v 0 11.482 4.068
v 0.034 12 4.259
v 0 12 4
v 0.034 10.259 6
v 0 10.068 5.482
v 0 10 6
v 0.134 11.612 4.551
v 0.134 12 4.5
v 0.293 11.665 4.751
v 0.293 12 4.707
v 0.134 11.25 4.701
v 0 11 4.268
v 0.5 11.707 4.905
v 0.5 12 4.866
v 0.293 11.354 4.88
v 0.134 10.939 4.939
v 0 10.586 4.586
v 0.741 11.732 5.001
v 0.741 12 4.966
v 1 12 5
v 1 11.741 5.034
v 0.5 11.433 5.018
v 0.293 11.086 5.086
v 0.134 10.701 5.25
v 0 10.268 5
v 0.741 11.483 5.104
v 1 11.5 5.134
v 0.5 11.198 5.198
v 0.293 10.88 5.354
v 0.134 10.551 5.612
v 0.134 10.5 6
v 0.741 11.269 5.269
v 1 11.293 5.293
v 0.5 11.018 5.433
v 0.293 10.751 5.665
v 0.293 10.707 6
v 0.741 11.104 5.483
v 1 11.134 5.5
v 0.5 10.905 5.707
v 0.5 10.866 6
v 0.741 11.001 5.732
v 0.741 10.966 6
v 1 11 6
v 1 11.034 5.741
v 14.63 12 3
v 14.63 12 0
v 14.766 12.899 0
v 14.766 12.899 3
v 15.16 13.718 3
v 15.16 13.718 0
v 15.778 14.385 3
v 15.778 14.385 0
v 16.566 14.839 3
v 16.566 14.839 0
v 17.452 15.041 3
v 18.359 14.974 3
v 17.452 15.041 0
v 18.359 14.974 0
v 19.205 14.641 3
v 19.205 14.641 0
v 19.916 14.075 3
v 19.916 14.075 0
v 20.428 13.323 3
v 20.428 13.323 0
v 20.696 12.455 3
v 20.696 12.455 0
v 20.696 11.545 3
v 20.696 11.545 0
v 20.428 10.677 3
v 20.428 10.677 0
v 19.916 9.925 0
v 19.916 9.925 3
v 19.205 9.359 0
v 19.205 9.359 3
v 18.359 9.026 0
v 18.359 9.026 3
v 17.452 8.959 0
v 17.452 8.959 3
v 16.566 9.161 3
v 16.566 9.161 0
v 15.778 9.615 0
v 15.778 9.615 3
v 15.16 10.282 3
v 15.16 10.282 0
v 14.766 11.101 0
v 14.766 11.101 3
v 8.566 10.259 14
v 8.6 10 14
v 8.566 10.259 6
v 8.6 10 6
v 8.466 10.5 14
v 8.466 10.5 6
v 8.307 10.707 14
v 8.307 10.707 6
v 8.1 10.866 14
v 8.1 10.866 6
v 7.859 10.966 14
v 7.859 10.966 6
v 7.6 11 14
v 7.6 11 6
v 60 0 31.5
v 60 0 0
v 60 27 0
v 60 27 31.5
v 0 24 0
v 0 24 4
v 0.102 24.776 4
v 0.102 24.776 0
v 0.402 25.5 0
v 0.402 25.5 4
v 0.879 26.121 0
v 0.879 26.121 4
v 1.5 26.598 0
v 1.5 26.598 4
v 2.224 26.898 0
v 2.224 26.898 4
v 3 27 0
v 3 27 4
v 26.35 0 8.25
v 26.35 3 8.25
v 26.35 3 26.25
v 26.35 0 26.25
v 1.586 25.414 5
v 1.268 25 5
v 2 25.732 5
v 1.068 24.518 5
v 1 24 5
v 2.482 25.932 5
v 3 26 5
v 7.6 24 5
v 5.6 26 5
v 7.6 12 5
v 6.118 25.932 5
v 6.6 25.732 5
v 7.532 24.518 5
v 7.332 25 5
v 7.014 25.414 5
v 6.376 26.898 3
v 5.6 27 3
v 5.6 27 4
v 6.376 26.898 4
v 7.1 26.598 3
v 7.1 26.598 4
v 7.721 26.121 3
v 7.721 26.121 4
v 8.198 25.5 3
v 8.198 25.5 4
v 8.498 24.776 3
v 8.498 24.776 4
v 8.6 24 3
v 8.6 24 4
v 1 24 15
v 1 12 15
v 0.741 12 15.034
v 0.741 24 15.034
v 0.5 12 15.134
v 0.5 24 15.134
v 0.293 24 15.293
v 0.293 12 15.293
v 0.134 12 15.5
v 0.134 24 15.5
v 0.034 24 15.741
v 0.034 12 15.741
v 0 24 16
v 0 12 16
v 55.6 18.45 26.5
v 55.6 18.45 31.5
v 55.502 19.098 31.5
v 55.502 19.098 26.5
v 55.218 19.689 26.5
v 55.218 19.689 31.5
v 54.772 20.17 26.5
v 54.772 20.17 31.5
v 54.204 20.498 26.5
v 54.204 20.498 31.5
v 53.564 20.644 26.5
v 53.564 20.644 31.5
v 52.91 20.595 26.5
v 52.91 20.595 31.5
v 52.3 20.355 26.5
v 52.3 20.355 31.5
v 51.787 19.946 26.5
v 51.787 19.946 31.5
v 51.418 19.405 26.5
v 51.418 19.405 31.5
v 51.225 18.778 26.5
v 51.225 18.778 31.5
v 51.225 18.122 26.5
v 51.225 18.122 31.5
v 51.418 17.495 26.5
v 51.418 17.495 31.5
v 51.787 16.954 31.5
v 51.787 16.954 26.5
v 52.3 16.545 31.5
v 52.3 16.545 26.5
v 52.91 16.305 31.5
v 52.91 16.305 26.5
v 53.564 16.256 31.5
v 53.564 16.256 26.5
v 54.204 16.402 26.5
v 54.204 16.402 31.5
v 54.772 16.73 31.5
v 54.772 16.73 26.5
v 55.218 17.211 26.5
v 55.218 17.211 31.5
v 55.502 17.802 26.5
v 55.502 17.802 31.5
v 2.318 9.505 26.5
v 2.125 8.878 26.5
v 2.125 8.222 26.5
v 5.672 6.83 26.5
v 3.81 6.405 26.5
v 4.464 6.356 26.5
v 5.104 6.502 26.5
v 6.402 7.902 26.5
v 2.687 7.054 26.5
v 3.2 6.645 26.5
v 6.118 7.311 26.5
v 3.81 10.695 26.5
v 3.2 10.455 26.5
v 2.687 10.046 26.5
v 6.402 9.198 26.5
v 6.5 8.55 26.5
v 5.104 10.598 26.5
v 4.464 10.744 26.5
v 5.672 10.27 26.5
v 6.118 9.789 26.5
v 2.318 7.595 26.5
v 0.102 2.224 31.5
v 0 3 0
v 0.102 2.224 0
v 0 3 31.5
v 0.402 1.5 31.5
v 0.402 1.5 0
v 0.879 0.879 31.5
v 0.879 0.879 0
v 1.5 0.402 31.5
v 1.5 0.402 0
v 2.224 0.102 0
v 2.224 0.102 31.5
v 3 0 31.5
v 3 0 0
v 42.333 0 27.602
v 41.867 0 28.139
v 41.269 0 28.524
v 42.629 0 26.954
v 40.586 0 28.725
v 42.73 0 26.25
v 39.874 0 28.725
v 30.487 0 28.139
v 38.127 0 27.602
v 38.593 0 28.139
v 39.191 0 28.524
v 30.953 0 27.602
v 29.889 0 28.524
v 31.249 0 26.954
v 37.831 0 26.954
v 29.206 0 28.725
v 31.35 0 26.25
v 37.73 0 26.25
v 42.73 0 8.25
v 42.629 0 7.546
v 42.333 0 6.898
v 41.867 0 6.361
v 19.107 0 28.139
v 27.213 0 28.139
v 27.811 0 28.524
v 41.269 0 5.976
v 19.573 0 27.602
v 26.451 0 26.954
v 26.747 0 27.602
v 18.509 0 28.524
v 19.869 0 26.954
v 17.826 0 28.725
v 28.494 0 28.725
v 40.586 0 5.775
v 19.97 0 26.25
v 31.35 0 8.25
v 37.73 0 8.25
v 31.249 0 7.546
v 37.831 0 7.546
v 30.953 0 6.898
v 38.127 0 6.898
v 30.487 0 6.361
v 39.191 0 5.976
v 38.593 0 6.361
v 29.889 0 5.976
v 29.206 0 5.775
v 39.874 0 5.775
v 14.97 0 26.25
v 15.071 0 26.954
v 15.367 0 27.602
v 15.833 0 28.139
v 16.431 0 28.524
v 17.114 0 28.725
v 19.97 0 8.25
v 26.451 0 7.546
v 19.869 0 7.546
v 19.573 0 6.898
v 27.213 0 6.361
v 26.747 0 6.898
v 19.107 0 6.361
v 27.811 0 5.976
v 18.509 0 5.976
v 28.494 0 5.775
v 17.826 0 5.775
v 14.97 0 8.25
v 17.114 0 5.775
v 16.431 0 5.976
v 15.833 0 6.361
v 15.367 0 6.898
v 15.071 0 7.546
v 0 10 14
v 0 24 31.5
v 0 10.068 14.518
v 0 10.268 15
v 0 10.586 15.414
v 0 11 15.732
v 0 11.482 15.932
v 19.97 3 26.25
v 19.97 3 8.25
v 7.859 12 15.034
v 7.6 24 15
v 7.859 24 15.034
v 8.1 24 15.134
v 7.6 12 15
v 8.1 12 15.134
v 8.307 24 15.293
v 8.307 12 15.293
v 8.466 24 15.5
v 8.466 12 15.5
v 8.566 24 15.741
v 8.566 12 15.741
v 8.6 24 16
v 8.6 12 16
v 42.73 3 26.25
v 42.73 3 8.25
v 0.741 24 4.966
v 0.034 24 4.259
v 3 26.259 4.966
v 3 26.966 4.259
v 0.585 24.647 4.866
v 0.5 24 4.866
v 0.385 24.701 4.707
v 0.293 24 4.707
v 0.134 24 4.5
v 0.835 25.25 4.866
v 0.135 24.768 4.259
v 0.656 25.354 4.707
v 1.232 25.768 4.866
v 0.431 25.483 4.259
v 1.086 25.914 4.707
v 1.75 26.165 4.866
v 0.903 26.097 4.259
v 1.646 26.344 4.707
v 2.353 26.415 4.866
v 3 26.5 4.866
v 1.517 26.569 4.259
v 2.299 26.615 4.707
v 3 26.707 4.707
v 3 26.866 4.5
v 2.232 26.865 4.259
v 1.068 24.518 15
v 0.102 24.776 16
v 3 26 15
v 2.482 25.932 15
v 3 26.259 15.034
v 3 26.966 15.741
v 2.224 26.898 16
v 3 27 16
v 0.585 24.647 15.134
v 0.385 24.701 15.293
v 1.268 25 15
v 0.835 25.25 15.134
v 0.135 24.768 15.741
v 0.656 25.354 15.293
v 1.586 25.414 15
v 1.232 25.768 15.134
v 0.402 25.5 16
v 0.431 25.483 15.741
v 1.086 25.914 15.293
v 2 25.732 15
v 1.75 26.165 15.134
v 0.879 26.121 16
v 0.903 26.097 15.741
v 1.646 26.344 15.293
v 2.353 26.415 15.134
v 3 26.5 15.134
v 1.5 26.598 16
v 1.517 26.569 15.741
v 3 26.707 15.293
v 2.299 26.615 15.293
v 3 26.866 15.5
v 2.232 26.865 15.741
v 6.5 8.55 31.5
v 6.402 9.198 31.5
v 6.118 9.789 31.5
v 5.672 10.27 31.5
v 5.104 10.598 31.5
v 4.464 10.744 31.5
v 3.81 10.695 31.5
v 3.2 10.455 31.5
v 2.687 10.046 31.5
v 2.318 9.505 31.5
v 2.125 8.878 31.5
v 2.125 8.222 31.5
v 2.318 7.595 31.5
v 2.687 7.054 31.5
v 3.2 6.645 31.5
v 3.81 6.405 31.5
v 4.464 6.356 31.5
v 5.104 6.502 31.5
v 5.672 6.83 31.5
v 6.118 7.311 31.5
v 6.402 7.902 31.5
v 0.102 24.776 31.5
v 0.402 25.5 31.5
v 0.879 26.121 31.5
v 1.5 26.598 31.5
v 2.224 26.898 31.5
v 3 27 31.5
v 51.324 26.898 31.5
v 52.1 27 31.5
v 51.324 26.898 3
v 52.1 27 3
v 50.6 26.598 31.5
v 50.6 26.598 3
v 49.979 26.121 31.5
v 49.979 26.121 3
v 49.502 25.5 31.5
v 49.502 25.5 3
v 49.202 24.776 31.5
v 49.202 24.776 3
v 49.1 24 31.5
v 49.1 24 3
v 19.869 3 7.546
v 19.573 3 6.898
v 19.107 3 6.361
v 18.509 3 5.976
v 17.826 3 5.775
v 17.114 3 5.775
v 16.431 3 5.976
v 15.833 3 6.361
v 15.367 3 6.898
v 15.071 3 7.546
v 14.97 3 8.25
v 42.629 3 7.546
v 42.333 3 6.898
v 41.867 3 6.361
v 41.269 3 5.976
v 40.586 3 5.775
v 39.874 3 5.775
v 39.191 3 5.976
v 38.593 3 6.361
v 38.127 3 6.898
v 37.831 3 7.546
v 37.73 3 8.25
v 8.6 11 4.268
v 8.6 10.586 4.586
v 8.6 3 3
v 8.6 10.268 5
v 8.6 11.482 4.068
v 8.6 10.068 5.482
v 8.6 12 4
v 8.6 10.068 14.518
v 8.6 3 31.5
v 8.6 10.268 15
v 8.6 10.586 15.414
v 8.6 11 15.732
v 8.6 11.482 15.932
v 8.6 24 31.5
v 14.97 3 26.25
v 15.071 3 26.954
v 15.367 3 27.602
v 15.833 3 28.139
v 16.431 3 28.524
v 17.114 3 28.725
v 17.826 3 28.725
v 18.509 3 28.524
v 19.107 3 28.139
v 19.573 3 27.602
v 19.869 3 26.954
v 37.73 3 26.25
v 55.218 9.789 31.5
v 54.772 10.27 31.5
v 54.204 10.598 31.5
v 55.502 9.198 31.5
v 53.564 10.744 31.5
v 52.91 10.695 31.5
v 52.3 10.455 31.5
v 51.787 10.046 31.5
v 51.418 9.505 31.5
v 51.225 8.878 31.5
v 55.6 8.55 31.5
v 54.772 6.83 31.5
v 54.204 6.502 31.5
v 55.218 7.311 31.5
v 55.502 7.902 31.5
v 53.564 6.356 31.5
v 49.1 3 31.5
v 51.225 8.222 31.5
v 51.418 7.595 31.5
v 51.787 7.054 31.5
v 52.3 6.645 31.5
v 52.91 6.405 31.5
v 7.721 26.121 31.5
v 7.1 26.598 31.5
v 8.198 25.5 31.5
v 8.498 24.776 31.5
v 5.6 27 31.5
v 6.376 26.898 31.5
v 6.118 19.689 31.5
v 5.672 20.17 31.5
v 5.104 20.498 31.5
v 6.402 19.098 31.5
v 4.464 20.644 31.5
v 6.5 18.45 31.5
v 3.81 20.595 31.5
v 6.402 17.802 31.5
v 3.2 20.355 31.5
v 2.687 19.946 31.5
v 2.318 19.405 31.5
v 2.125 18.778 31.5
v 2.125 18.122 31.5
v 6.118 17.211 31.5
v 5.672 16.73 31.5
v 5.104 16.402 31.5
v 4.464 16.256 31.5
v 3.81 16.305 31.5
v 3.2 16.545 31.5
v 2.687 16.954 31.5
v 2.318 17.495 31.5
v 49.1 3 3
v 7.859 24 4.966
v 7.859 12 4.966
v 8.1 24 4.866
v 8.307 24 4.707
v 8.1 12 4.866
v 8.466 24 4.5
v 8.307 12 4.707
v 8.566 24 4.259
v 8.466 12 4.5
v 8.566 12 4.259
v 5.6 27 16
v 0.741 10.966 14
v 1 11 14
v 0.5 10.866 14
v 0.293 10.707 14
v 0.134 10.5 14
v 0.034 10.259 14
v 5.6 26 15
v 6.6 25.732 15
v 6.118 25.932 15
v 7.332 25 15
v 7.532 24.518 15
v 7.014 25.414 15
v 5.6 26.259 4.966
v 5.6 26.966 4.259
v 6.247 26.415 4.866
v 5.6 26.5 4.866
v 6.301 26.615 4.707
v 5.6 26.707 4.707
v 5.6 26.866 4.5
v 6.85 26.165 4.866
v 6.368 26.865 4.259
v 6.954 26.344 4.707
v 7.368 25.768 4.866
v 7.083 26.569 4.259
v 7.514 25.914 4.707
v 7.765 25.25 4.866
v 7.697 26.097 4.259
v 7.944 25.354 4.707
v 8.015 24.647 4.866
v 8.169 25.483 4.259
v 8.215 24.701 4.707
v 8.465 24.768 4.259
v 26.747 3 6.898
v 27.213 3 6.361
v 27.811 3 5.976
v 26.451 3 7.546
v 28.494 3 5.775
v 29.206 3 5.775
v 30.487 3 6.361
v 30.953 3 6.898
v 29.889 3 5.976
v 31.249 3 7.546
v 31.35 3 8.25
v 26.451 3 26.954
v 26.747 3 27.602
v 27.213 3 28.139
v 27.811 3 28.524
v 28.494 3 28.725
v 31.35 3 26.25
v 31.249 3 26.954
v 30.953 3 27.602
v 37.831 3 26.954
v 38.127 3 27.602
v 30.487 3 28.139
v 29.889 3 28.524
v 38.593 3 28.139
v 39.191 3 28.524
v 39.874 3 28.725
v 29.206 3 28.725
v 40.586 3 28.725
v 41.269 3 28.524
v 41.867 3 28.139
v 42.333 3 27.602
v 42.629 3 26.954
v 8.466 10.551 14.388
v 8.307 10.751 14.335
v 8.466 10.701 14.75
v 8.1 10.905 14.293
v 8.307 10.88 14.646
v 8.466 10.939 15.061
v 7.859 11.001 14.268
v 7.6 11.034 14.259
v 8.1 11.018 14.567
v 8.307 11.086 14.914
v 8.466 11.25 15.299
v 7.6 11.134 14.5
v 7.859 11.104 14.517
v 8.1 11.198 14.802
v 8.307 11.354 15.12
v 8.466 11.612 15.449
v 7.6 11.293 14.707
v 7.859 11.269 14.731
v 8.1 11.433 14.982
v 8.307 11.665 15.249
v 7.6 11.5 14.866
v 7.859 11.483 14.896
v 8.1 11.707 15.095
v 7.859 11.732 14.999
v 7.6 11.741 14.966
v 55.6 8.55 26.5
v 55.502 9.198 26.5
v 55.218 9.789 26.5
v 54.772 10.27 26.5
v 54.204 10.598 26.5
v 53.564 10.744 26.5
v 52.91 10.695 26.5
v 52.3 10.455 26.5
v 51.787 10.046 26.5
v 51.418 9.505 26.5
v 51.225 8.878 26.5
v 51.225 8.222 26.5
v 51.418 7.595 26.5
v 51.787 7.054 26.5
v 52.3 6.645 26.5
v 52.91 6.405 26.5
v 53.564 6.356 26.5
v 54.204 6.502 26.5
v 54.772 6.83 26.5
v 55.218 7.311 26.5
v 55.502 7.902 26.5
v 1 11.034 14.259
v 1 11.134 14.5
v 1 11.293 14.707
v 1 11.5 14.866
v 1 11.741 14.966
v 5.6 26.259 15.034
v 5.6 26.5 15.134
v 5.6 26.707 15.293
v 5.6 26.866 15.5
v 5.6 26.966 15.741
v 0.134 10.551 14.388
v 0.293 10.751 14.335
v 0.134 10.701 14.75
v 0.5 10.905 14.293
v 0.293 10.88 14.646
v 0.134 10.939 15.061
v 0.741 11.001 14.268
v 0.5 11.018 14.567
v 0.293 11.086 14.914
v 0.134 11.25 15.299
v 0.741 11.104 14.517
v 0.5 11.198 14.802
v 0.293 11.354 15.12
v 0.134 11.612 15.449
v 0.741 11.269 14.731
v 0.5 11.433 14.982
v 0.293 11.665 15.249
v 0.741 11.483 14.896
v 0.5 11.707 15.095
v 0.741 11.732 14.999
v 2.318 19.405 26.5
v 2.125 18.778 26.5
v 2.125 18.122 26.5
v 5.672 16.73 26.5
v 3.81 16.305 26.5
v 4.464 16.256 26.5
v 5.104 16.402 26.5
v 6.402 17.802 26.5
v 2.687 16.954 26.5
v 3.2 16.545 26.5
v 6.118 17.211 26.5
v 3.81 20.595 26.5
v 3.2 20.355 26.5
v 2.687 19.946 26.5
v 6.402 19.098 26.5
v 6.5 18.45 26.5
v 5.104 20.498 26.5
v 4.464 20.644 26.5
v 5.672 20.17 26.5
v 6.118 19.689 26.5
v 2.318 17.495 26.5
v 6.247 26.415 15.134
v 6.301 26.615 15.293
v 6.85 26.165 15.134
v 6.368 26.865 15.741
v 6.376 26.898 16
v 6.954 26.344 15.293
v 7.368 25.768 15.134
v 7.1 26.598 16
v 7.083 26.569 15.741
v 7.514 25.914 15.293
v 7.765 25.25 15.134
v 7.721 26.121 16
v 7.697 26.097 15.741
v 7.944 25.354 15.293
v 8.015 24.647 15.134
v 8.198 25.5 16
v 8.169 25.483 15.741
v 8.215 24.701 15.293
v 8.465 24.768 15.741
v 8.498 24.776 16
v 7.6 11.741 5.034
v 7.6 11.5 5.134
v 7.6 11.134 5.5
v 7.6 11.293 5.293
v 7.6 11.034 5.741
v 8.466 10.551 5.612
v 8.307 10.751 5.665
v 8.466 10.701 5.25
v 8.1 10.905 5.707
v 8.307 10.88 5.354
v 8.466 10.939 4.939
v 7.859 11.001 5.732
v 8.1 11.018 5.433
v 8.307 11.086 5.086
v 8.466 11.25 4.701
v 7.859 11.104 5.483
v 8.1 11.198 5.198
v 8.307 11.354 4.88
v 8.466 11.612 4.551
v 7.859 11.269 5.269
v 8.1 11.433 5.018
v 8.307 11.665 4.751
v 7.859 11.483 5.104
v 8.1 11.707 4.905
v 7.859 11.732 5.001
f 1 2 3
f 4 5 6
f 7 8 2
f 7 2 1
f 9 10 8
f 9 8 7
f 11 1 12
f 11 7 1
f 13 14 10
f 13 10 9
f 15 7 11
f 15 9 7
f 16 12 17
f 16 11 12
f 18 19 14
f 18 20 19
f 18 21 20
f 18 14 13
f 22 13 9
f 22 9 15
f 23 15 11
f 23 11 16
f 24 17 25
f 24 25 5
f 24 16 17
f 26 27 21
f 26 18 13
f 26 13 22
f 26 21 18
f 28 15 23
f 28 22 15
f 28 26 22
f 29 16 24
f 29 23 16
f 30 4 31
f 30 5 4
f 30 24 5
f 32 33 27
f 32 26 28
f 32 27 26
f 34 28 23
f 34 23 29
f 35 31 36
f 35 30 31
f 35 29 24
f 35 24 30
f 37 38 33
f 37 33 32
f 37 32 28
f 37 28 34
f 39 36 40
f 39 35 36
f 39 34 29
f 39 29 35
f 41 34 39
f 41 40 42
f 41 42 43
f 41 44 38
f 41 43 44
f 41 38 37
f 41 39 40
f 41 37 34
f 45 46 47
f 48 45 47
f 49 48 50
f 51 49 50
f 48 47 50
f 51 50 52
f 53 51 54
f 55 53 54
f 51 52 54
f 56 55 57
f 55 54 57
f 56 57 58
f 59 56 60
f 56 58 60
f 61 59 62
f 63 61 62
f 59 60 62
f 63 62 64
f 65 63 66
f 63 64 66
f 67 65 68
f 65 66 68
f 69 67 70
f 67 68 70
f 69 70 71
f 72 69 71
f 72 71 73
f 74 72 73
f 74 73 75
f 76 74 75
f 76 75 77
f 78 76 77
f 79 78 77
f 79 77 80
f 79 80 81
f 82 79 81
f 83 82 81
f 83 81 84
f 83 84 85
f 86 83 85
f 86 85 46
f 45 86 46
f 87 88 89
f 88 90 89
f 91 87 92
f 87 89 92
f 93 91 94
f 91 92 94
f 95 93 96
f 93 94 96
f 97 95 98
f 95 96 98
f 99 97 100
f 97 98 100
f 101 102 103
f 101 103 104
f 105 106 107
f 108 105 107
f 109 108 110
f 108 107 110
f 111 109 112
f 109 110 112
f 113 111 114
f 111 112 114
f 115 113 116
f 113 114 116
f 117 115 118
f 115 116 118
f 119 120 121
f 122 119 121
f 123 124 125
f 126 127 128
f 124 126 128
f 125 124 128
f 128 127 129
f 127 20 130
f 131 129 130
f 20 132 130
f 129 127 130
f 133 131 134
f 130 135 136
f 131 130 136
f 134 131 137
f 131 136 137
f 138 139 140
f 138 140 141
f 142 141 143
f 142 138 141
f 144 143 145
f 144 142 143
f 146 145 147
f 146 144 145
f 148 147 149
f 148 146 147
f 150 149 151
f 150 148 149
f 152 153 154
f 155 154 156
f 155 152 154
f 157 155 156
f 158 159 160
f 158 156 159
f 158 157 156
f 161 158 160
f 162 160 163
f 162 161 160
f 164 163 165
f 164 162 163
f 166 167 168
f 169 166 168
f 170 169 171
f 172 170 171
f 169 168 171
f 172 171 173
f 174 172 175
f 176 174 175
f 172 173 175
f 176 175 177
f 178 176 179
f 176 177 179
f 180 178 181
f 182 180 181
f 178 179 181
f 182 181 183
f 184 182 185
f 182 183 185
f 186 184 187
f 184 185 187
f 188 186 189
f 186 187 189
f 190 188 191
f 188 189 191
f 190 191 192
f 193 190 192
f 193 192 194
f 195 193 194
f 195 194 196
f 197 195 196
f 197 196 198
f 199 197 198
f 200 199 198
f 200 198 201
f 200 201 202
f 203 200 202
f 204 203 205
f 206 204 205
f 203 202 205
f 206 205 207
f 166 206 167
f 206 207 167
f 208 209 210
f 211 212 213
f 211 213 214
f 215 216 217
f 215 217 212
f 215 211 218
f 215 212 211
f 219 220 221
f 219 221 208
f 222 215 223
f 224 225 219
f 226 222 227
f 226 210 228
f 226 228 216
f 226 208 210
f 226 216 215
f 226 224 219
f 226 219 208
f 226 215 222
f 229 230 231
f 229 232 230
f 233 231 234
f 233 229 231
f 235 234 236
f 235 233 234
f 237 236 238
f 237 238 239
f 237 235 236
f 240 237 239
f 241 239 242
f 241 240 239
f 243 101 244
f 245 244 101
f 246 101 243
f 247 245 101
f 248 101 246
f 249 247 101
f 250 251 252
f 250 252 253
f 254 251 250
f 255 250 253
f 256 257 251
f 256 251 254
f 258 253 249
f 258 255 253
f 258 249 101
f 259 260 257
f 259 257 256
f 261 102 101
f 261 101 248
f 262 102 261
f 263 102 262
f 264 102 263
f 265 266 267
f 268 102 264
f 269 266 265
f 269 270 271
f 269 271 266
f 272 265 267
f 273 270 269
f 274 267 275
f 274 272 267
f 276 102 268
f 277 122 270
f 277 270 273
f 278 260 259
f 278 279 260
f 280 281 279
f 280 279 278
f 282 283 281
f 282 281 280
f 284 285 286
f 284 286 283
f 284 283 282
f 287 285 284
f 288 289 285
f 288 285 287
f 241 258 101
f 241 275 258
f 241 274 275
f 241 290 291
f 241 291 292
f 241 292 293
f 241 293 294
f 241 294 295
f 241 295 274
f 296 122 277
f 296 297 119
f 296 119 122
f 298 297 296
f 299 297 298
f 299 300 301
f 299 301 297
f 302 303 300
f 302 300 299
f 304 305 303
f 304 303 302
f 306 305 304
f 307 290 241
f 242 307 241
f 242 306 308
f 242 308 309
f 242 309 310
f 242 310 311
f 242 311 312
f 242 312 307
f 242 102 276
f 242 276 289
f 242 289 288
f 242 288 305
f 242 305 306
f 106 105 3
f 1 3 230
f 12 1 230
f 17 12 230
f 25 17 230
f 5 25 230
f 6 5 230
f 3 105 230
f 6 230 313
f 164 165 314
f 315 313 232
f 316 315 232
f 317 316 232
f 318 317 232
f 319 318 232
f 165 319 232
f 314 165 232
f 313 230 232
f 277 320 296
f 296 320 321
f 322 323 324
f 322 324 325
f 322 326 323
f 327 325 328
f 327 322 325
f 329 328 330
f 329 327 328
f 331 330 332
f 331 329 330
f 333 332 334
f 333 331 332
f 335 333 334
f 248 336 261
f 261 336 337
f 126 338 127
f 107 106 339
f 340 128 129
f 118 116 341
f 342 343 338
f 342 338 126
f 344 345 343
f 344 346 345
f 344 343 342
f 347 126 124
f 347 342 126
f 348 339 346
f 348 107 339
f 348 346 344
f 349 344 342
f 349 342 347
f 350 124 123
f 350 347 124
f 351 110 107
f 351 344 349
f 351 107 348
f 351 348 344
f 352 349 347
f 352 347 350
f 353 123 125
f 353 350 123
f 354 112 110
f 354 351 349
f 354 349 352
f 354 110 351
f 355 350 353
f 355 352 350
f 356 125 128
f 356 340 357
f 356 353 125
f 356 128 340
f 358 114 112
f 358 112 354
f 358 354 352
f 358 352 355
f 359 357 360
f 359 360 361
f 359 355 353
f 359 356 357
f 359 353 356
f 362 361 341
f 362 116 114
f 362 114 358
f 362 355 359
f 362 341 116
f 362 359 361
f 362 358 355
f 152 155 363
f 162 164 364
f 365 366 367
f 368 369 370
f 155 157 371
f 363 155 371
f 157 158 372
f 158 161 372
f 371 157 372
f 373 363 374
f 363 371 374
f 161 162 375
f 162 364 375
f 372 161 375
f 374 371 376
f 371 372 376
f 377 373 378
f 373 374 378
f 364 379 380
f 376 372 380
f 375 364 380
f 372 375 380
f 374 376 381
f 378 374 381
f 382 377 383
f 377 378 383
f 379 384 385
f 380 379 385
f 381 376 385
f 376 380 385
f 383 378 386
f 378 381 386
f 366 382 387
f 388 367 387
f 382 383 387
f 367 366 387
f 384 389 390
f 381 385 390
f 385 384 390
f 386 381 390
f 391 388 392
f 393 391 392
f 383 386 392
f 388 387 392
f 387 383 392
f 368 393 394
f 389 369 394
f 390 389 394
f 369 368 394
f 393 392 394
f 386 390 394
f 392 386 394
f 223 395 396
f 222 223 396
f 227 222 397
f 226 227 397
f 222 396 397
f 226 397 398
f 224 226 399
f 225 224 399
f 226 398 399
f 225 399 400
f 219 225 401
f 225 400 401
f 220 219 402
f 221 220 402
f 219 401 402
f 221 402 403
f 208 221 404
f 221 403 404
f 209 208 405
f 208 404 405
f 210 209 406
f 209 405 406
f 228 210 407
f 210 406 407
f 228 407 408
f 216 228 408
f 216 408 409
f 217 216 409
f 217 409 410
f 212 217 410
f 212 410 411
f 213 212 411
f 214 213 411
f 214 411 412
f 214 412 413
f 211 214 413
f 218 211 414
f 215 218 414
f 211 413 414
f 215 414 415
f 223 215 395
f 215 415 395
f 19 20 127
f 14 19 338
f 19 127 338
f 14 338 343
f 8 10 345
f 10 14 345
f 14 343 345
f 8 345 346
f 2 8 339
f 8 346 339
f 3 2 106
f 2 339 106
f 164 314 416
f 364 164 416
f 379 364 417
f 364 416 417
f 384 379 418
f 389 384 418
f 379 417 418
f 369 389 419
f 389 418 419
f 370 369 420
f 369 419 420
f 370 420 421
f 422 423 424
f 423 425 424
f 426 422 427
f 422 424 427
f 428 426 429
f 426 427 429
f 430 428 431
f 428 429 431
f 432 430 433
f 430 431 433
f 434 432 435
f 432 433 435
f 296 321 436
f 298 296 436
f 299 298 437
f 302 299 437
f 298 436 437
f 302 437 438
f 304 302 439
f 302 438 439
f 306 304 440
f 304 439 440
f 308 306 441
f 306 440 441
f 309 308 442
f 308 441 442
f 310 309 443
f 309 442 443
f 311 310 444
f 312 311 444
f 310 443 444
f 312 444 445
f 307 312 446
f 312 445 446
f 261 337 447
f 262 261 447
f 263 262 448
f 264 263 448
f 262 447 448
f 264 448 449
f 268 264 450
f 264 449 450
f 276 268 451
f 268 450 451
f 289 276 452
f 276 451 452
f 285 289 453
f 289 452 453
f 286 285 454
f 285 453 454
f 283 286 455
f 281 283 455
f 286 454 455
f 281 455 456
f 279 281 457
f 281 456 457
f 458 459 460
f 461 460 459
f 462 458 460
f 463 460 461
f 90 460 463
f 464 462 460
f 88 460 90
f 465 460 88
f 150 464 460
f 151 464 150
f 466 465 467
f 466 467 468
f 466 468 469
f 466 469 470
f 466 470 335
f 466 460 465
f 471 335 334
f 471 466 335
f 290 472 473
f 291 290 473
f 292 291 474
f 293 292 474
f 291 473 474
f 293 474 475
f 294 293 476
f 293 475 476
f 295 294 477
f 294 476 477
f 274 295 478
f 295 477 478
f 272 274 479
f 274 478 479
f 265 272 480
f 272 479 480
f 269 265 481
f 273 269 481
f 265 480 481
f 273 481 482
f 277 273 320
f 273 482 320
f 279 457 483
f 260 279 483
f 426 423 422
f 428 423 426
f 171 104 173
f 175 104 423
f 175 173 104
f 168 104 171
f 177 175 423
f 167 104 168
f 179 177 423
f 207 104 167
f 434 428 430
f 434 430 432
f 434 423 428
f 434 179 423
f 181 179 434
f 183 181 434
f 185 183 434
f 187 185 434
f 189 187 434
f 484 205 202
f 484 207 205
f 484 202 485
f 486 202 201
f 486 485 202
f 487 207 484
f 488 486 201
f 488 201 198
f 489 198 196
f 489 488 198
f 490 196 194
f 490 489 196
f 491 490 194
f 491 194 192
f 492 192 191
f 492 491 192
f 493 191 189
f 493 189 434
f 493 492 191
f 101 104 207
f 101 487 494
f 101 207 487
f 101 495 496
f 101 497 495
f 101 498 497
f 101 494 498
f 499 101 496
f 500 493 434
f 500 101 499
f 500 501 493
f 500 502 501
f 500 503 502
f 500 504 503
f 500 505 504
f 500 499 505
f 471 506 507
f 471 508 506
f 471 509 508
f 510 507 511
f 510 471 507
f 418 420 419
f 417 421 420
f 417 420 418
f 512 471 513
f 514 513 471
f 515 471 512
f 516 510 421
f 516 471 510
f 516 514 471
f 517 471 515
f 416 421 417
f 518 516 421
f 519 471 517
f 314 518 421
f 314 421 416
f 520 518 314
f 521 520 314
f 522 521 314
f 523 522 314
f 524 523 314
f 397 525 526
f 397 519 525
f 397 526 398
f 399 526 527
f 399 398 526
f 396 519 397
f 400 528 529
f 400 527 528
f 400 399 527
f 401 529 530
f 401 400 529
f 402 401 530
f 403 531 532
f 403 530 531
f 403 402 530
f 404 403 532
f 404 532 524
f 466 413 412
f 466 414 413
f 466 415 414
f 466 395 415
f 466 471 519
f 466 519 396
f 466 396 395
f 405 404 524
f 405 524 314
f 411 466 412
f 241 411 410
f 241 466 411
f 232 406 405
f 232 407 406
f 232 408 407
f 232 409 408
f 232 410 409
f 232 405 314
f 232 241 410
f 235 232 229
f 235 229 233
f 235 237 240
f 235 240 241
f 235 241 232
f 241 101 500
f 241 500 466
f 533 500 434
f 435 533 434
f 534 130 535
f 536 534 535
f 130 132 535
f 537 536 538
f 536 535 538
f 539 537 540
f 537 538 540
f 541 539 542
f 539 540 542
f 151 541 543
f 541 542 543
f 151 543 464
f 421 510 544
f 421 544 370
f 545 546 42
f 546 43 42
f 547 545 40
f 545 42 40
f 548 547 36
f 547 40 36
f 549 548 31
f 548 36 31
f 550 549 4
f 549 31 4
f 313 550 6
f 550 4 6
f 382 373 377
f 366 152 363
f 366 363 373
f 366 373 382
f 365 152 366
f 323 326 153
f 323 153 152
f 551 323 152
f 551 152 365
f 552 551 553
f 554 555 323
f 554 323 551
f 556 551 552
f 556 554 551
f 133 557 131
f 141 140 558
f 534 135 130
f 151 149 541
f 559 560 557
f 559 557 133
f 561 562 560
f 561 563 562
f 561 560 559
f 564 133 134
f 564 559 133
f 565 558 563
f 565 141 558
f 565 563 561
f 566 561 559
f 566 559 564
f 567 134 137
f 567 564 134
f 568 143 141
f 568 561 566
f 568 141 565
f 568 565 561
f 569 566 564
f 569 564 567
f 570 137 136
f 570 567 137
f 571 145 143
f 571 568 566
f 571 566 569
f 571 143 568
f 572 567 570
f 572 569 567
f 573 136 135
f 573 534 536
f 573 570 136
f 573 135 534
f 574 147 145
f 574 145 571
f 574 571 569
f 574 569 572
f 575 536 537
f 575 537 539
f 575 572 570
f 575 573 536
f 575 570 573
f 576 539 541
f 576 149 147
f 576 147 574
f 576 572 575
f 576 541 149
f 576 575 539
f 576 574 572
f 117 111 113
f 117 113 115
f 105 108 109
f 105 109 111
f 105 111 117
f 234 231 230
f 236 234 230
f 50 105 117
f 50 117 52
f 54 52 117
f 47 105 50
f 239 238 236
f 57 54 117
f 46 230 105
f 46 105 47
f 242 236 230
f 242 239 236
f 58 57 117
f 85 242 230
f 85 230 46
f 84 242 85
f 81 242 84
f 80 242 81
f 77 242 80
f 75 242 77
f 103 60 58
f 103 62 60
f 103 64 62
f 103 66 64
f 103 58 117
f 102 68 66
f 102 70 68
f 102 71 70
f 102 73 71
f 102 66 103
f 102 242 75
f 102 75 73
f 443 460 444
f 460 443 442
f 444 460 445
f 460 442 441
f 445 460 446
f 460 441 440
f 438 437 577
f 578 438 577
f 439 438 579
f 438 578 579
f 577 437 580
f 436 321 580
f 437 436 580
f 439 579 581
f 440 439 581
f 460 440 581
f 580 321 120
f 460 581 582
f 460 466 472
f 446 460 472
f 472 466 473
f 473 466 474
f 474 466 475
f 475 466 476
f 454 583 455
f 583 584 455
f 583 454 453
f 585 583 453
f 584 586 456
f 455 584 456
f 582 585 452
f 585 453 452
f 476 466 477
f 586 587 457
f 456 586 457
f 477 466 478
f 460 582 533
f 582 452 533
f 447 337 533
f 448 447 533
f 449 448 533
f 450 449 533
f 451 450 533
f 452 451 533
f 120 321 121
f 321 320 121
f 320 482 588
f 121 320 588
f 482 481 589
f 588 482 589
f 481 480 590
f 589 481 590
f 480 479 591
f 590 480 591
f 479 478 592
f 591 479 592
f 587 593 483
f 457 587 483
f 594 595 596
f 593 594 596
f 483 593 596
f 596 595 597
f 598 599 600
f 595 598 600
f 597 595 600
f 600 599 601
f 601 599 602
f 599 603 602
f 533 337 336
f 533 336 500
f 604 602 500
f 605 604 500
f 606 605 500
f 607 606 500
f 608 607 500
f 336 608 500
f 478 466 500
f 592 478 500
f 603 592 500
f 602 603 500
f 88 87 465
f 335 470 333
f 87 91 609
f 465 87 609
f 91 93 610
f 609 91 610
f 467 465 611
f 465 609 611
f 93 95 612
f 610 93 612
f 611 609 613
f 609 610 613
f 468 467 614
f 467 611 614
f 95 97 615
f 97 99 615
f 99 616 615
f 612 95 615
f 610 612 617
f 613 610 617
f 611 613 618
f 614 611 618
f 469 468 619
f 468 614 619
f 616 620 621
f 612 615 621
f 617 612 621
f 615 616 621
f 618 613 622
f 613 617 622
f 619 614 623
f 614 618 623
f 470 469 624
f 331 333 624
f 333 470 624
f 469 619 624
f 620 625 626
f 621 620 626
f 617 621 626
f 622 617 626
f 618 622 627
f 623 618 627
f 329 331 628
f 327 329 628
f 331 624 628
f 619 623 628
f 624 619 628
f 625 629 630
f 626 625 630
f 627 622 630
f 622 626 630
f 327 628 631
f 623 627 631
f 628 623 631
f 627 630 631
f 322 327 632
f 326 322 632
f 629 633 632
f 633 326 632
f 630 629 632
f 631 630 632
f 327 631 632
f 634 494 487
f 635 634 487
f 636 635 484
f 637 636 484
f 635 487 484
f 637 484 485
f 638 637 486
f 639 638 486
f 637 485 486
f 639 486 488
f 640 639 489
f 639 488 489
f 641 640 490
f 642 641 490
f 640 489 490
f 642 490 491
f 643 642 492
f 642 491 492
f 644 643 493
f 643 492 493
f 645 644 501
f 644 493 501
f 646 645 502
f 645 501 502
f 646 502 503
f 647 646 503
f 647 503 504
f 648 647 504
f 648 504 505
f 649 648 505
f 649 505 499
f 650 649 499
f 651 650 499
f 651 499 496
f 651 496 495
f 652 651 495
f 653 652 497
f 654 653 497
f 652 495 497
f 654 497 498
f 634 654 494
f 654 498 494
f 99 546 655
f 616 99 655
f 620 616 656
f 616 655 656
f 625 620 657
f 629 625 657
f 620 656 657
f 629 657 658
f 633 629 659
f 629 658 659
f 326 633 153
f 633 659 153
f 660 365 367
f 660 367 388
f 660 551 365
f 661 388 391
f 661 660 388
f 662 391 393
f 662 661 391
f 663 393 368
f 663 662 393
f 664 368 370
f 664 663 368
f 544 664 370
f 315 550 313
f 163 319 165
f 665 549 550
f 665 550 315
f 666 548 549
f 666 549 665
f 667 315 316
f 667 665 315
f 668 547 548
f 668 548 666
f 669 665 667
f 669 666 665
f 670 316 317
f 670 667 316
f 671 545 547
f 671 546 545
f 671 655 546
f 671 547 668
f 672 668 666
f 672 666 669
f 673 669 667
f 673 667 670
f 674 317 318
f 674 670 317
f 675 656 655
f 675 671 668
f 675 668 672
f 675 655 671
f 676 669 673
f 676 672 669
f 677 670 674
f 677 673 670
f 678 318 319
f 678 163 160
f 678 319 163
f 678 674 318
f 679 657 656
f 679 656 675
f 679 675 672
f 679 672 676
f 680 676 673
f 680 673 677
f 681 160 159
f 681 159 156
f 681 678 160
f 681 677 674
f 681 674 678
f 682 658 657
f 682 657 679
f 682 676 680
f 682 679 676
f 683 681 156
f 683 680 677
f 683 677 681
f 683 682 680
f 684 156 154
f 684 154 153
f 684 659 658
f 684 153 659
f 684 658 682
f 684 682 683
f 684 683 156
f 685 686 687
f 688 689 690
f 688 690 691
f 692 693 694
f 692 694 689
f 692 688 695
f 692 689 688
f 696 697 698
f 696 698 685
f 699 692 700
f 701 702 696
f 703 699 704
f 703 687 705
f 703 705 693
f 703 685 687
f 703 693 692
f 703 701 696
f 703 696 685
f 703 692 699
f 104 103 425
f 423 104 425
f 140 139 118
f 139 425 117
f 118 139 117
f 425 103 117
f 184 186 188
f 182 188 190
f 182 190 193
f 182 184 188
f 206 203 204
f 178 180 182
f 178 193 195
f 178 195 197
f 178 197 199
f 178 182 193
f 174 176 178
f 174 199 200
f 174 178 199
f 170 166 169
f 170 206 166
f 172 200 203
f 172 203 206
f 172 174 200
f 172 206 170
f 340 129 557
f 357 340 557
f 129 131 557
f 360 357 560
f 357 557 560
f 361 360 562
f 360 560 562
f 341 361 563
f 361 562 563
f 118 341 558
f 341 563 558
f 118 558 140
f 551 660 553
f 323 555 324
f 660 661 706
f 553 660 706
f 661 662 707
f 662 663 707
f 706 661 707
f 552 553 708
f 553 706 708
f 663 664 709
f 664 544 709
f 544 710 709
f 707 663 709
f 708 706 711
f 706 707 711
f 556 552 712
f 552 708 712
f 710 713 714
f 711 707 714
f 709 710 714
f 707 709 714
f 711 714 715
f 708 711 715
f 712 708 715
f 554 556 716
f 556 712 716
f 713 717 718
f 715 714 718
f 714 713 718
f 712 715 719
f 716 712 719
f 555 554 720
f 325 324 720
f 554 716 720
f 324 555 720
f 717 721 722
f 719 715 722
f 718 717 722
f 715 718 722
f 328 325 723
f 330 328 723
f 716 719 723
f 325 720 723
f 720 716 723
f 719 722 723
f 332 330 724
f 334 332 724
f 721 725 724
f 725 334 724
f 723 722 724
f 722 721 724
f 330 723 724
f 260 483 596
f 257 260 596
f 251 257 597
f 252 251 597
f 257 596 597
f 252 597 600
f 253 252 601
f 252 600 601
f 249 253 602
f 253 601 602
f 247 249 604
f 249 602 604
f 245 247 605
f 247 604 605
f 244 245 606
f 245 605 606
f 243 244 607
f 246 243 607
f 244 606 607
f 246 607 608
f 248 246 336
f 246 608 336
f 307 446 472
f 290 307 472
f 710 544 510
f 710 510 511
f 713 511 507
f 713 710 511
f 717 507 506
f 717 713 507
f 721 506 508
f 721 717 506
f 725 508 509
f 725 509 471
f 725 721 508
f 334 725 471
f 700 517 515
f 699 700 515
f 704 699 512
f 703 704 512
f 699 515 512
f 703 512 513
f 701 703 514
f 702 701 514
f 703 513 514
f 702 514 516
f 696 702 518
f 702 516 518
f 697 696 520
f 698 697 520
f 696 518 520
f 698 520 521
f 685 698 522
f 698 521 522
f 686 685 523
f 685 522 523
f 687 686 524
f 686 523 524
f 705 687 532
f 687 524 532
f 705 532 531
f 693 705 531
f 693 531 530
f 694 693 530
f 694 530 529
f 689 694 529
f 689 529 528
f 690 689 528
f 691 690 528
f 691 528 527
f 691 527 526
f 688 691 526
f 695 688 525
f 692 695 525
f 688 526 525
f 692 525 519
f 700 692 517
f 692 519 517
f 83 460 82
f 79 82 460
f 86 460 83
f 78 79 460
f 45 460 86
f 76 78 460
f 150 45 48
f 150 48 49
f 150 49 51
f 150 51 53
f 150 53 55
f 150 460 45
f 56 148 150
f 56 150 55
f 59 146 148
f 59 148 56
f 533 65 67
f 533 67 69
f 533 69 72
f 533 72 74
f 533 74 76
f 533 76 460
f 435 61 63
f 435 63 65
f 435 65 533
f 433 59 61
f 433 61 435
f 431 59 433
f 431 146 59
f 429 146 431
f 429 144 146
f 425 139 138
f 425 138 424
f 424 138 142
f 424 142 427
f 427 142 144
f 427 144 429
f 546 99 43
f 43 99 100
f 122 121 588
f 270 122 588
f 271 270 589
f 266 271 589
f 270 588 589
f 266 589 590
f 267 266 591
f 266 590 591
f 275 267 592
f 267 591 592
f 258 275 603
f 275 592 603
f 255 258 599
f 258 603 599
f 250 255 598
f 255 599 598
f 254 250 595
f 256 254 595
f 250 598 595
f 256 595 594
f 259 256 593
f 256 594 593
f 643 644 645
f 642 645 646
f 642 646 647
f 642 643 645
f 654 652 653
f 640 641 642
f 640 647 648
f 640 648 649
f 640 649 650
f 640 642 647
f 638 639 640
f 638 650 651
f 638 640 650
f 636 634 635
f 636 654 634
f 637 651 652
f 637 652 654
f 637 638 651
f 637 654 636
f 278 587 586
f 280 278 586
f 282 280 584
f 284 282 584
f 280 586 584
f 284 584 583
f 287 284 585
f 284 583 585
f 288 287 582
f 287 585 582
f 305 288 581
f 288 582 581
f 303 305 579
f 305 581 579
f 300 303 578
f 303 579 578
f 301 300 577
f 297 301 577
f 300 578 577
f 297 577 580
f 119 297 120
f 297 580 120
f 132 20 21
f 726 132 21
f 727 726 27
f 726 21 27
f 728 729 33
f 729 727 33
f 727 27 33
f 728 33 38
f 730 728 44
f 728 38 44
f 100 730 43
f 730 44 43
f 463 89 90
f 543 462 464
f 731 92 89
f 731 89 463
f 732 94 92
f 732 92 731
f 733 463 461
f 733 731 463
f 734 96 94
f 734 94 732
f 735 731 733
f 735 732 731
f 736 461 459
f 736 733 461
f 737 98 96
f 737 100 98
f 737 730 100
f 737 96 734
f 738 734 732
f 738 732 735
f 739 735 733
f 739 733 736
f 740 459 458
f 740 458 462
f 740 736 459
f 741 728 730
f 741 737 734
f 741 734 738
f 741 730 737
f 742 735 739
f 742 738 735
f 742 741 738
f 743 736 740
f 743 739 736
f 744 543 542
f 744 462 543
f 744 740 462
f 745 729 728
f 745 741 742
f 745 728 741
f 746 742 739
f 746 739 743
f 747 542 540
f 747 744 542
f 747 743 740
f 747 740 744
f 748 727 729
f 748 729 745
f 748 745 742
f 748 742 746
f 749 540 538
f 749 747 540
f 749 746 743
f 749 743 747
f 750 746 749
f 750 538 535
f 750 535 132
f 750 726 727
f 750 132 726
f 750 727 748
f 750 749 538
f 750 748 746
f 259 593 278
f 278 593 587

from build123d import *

# Parameters (mm, degrees)
BOSS_EXTRUDE1_DEPTH = 27
SKETCH2_R           = 2.2
CUT_EXTRUDE1_DEPTH  = 5
SKETCH4_W           = 40.5
SKETCH4_H           = 21
CUT_EXTRUDE2_DEPTH  = 28.5
SKETCH5_W           = 40.5
SKETCH5_H           = 3
CUT_EXTRUDE4_DEPTH  = 28.5
CUT_EXTRUDE7_DEPTH  = 3
SKETCH6_W           = 10
SKETCH6_H           = 16
CUT_EXTRUDE5_DEPTH  = 28.5
FILLET1_R           = 3
FILLET2_R           = 1
SKETCH9_R           = 3.05
CUT_EXTRUDE6_DEPTH  = 10


with BuildPart() as part:
    # Sketch1 → Boss-Extrude1 (new body)
    with BuildSketch(Plane(origin=(0, 0, 0), x_dir=(1, 0, 0), z_dir=(0, 1, 0))):
        Polygon((0, 0), (60, 0), (60, -31.5), (0, -31.5), (0, -26.5), (0, -3), align=None)
    extrude(amount=BOSS_EXTRUDE1_DEPTH)

    # Sketch2 → Cut-Extrude1 (cut)
    with BuildSketch(Plane.XY.offset(31.5)):
        with Locations((4.3, 18.45)):
            Circle(SKETCH2_R)
        with Locations((4.3, 8.55)):
            Circle(SKETCH2_R)
        with Locations((53.4, 18.45)):
            Circle(SKETCH2_R)
        with Locations((53.4, 8.55)):
            Circle(SKETCH2_R)
    extrude(amount=-CUT_EXTRUDE1_DEPTH, mode=Mode.SUBTRACT)

    # Sketch4 → Cut-Extrude2 (cut)
    with BuildSketch(Plane.XY.offset(31.5)):
        with Locations((28.85, 13.5)):
            Rectangle(SKETCH4_W, SKETCH4_H)
    extrude(amount=-CUT_EXTRUDE2_DEPTH, mode=Mode.SUBTRACT)

    # Sketch5 → Cut-Extrude4 (cut)
    with BuildSketch(Plane.XY.offset(31.5)):
        with Locations((28.85, 25.5)):
            Rectangle(SKETCH5_W, SKETCH5_H)
    extrude(amount=-CUT_EXTRUDE4_DEPTH, mode=Mode.SUBTRACT)

    # Sketch10 → Cut-Extrude7 (cut)
    with BuildSketch(Plane(origin=(0, 3, 0), x_dir=(1, 0, 0), z_dir=(0, 1, 0))):
        with BuildLine():
            Line((31.35, -26.25), (31.35, -8.25))
            ThreePointArc((31.35, -8.25), (28.85, -5.75), (26.35, -8.25))
            Line((26.35, -8.25), (26.35, -26.25))
            ThreePointArc((26.35, -26.25), (28.85, -28.75), (31.35, -26.25))
        make_face()
        with BuildLine():
            Line((42.73, -26.25), (42.73, -8.25))
            ThreePointArc((42.73, -8.25), (40.23, -5.75), (37.73, -8.25))
            Line((37.73, -8.25), (37.73, -26.25))
            ThreePointArc((37.73, -26.25), (40.23, -28.75), (42.73, -26.25))
        make_face()
        with BuildLine():
            Line((19.97, -26.25), (19.97, -8.25))
            ThreePointArc((19.97, -8.25), (17.47, -5.75), (14.97, -8.25))
            Line((14.97, -8.25), (14.97, -26.25))
            ThreePointArc((14.97, -26.25), (17.47, -28.75), (19.97, -26.25))
        make_face()
    extrude(amount=-CUT_EXTRUDE7_DEPTH, mode=Mode.SUBTRACT)

    # Sketch6 → Cut-Extrude5 (cut)
    with BuildSketch(Plane(origin=(8.6, 0, 0), x_dir=(0, 0, -1), z_dir=(1, 0, 0))):
        with Locations((-10, 19)):
            Rectangle(SKETCH6_W, SKETCH6_H)
    extrude(amount=-CUT_EXTRUDE5_DEPTH, mode=Mode.SUBTRACT)

    # Fillet1
    fillet1_edges = [part.edges().sort_by_distance(p)[0] for p in [
        (8.6, 27, 23.25),
        (0, 27, 23.25),
        (0, 27, 2.5),
        (8.6, 27, 4),
        (49.1, 27, 17.25),
        (0, 0, 15.75),
    ]]
    fillet(fillet1_edges, radius=FILLET1_R)

    # Fillet2
    fillet2_edges = [part.edges().sort_by_distance(p)[0] for p in [
        (4.3, 11, 15),
        (0, 17.5, 5),
        (0, 11, 10),
        (4.3, 11, 5),
        (8.6, 11, 10),
        (8.6, 17.5, 5),
        (0, 17.5, 15),
        (4.3, 27, 5),
        (7.721320344, 26.121320344, 5),
        (0.878679656, 26.121320344, 5),
        (8.6, 17.5, 15),
        (4.3, 27, 15),
        (7.721320344, 26.121320344, 15),
        (0.878679656, 26.121320344, 15),
    ]]
    fillet(fillet2_edges, radius=FILLET2_R)

    # Sketch9 → Cut-Extrude6 (cut)
    with BuildSketch(Plane(origin=(0, 0, 0), x_dir=(-1, 0, 0), z_dir=(0, 0, -1))):
        with Locations((-17.68, 12)):
            Circle(SKETCH9_R)
    extrude(amount=-CUT_EXTRUDE6_DEPTH, mode=Mode.SUBTRACT)


solid = part.part
